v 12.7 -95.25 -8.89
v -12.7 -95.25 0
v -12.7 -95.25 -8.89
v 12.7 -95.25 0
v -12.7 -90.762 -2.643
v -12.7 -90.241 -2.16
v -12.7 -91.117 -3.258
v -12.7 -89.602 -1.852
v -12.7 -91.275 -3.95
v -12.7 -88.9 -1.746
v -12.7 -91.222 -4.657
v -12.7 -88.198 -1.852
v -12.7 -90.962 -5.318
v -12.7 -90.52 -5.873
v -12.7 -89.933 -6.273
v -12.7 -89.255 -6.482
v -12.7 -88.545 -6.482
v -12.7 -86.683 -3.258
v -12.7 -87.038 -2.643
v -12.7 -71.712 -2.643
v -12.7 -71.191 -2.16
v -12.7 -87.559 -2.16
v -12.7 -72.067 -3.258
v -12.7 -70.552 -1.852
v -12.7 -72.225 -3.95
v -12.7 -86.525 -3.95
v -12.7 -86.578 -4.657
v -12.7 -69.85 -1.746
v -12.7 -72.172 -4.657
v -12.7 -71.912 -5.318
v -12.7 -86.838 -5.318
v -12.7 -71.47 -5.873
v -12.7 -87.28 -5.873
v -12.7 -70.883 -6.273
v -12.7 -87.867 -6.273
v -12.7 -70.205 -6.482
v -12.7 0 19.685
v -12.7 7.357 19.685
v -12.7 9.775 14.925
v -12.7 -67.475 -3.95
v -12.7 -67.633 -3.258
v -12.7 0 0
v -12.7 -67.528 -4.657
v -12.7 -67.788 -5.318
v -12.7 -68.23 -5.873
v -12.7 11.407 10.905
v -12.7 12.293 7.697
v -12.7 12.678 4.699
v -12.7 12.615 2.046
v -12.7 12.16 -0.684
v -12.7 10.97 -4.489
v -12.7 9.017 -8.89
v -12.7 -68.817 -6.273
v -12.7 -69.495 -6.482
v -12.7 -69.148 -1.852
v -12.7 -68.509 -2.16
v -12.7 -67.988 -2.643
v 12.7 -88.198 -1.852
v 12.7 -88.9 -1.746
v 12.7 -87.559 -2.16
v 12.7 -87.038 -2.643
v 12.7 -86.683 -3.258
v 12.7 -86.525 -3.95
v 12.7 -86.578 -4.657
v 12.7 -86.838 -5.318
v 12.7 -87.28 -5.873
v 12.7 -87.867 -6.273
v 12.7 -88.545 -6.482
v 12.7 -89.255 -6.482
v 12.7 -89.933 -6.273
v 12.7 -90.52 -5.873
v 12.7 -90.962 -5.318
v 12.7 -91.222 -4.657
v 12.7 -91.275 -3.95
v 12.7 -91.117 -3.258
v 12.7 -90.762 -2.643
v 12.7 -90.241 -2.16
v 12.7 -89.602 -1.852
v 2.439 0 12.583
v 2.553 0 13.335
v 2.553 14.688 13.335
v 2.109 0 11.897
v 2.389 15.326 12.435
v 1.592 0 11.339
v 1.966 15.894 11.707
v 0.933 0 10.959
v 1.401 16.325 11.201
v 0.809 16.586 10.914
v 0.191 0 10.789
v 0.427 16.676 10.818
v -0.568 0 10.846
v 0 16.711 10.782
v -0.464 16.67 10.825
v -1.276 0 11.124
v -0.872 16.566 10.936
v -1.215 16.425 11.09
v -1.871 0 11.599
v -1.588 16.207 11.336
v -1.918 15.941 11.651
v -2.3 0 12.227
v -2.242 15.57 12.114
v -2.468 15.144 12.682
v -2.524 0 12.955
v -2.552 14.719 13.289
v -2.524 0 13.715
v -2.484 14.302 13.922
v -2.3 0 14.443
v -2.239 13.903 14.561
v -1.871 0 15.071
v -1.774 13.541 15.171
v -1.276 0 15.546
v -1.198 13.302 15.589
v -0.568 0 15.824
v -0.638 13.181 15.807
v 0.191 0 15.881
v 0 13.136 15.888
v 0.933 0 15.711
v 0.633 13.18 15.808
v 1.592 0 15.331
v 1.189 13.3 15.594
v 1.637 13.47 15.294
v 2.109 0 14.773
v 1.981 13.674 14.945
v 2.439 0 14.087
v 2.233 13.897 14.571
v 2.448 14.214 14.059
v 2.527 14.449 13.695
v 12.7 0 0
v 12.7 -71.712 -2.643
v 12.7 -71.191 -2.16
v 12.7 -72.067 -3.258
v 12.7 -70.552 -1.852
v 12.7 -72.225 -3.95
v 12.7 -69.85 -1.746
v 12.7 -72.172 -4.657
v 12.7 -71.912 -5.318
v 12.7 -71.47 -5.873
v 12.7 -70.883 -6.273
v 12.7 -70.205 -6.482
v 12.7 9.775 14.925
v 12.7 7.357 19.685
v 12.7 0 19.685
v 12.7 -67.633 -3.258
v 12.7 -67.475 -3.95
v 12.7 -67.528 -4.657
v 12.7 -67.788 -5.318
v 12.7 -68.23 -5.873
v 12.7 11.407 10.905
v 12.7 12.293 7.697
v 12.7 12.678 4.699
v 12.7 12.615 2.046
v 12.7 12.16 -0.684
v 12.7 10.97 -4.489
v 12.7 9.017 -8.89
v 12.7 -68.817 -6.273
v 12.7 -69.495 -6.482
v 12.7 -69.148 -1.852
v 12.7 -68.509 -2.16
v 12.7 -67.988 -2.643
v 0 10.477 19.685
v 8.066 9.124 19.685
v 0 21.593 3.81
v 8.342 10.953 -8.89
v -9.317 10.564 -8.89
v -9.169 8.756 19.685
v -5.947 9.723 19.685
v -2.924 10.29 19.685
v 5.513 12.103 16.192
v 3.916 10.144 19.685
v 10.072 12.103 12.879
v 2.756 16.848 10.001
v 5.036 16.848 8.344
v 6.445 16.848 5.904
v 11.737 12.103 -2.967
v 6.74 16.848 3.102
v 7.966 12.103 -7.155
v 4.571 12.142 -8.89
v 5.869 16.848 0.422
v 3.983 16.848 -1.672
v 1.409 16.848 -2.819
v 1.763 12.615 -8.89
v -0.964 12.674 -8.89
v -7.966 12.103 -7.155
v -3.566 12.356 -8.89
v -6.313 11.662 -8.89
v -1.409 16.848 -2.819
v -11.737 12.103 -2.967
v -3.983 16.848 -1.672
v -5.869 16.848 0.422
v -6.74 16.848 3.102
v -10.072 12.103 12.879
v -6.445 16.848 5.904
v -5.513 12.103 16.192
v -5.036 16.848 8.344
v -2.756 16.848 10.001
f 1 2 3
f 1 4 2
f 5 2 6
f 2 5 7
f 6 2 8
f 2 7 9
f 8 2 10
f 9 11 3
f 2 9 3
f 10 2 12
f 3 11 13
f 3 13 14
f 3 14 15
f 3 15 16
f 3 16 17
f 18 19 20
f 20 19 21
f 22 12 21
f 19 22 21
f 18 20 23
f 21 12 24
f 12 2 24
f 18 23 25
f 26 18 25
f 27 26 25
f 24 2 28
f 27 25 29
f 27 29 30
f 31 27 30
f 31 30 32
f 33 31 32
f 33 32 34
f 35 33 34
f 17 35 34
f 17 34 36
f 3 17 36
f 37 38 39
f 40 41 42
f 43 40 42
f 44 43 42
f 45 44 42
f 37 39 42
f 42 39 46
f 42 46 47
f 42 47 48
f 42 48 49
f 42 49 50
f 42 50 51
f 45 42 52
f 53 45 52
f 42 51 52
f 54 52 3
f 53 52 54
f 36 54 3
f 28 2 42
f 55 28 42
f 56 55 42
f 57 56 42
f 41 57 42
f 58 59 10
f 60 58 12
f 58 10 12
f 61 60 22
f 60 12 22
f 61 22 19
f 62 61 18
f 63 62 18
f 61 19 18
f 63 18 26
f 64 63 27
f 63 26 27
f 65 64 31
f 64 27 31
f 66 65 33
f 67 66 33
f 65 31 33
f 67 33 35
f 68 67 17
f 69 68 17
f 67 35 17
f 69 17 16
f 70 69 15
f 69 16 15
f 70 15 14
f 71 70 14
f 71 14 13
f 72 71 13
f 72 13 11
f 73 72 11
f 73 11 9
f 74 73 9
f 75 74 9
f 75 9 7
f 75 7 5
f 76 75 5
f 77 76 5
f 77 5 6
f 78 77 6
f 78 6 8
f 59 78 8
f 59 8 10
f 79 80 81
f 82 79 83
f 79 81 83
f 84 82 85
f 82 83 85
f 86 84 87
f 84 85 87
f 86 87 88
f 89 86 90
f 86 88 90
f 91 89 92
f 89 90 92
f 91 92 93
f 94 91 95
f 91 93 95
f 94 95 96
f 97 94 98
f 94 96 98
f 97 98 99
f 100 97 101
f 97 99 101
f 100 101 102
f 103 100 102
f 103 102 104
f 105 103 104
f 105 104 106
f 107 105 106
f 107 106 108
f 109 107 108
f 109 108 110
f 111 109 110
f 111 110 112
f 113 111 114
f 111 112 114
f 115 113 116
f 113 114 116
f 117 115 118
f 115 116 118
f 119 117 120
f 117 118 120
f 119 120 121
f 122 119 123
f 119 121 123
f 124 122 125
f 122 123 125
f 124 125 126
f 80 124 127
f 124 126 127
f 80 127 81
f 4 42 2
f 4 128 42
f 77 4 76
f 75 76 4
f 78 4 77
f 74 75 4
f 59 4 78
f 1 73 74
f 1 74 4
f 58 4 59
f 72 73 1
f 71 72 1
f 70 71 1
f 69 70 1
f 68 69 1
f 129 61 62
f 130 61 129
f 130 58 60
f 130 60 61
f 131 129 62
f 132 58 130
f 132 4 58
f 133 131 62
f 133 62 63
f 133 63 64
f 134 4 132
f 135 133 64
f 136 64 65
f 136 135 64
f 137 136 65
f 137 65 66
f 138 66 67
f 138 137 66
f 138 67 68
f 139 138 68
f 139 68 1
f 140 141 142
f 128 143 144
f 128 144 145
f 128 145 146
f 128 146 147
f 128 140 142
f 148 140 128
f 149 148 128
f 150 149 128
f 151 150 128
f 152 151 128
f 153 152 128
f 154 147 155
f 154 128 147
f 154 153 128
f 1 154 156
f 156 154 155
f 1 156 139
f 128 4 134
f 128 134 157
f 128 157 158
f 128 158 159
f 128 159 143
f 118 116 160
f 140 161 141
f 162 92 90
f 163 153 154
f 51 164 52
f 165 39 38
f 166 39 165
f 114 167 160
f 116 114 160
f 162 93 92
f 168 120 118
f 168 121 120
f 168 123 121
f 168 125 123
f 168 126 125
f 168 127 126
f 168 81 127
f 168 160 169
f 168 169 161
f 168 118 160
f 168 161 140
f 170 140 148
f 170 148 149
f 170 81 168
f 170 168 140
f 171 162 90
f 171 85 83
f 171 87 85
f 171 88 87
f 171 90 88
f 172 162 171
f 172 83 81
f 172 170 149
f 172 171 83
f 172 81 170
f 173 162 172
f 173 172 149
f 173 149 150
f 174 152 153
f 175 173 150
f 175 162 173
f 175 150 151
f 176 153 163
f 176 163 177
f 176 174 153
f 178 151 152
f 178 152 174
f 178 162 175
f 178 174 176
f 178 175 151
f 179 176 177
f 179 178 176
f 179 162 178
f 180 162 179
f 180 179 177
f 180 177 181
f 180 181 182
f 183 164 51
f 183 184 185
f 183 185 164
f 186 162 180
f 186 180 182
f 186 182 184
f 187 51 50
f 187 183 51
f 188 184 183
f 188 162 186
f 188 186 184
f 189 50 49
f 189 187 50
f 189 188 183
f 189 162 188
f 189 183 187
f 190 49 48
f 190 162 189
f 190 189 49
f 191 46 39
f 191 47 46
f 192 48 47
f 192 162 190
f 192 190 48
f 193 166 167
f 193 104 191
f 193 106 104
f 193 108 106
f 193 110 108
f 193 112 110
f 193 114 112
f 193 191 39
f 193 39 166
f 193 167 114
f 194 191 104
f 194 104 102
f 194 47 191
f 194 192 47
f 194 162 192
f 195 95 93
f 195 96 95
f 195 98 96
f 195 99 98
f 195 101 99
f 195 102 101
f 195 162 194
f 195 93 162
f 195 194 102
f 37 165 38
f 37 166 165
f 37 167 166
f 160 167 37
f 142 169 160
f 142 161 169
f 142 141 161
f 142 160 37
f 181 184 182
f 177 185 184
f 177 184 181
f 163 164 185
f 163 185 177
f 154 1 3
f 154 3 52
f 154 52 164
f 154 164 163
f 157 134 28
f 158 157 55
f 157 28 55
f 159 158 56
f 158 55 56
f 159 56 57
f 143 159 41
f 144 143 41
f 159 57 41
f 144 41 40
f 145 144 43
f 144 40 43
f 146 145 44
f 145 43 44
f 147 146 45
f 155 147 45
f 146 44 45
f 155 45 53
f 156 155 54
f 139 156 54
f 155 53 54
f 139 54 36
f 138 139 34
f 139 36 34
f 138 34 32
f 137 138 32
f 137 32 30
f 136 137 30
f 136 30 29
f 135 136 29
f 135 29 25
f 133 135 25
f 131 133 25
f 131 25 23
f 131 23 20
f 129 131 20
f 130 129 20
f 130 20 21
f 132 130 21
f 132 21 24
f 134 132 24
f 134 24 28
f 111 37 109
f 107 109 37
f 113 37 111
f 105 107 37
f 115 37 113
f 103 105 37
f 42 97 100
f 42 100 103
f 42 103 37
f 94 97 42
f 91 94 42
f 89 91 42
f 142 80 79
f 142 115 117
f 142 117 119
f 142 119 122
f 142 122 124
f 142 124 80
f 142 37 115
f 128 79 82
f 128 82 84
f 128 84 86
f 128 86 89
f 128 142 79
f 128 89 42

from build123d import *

# Parameters (mm, degrees)
BOSS_EXTRUDE1_DEPTH         = 12.7
F_1_4_20_TAPPED_HOLE1_D     = 5.1054
F_3_16_0_1875_DOWEL_HOLE1_D = 4.7625


with BuildPart() as part:
    # Sketch1 → Boss-Extrude1 (new body, symmetric)
    with BuildSketch(Plane(origin=(0, 0, 0), x_dir=(0, 0, -1), z_dir=(1, 0, 0))):
        Polygon((8.89, -95.25), (8.89, 22.225), (-19.685, 22.225), (-19.685, 0), (0, 0), (0, -95.25), align=None)
    extrude(amount=BOSS_EXTRUDE1_DEPTH, both=True)

    # Sketch2 → Cut-Revolve4 (revolve, cut)
    with BuildSketch(Plane(origin=(0, 0, 0), x_dir=(0, 0, -1), z_dir=(1, 0, 0))):
        Polygon((-26.697108117, 5.566910104), (-3.81, 21.592635735), (-3.81, 22.225), (-26.697108117, 22.225), align=None)
    revolve(axis=Axis((0, 21.592635735, 3.81), (0, 1, 0)), mode=Mode.SUBTRACT)

    # 1/4-20 Tapped Hole1 (through all)
    with Locations(Plane(origin=(0, 0, 0), x_dir=(-1, 0, 0), z_dir=(0, -1, 0))):
        with Locations((0, -13.335)):
            Hole(F_1_4_20_TAPPED_HOLE1_D / 2)

    # 3/16 (0.1875) Dowel Hole1 (through all)
    with Locations(Plane(origin=(12.7, 0, 0), x_dir=(0, 0, -1), z_dir=(1, 0, 0))):
        with Locations((4.1275, -88.9), (4.1275, -69.85)):
            Hole(F_3_16_0_1875_DOWEL_HOLE1_D / 2)


solid = part.part
